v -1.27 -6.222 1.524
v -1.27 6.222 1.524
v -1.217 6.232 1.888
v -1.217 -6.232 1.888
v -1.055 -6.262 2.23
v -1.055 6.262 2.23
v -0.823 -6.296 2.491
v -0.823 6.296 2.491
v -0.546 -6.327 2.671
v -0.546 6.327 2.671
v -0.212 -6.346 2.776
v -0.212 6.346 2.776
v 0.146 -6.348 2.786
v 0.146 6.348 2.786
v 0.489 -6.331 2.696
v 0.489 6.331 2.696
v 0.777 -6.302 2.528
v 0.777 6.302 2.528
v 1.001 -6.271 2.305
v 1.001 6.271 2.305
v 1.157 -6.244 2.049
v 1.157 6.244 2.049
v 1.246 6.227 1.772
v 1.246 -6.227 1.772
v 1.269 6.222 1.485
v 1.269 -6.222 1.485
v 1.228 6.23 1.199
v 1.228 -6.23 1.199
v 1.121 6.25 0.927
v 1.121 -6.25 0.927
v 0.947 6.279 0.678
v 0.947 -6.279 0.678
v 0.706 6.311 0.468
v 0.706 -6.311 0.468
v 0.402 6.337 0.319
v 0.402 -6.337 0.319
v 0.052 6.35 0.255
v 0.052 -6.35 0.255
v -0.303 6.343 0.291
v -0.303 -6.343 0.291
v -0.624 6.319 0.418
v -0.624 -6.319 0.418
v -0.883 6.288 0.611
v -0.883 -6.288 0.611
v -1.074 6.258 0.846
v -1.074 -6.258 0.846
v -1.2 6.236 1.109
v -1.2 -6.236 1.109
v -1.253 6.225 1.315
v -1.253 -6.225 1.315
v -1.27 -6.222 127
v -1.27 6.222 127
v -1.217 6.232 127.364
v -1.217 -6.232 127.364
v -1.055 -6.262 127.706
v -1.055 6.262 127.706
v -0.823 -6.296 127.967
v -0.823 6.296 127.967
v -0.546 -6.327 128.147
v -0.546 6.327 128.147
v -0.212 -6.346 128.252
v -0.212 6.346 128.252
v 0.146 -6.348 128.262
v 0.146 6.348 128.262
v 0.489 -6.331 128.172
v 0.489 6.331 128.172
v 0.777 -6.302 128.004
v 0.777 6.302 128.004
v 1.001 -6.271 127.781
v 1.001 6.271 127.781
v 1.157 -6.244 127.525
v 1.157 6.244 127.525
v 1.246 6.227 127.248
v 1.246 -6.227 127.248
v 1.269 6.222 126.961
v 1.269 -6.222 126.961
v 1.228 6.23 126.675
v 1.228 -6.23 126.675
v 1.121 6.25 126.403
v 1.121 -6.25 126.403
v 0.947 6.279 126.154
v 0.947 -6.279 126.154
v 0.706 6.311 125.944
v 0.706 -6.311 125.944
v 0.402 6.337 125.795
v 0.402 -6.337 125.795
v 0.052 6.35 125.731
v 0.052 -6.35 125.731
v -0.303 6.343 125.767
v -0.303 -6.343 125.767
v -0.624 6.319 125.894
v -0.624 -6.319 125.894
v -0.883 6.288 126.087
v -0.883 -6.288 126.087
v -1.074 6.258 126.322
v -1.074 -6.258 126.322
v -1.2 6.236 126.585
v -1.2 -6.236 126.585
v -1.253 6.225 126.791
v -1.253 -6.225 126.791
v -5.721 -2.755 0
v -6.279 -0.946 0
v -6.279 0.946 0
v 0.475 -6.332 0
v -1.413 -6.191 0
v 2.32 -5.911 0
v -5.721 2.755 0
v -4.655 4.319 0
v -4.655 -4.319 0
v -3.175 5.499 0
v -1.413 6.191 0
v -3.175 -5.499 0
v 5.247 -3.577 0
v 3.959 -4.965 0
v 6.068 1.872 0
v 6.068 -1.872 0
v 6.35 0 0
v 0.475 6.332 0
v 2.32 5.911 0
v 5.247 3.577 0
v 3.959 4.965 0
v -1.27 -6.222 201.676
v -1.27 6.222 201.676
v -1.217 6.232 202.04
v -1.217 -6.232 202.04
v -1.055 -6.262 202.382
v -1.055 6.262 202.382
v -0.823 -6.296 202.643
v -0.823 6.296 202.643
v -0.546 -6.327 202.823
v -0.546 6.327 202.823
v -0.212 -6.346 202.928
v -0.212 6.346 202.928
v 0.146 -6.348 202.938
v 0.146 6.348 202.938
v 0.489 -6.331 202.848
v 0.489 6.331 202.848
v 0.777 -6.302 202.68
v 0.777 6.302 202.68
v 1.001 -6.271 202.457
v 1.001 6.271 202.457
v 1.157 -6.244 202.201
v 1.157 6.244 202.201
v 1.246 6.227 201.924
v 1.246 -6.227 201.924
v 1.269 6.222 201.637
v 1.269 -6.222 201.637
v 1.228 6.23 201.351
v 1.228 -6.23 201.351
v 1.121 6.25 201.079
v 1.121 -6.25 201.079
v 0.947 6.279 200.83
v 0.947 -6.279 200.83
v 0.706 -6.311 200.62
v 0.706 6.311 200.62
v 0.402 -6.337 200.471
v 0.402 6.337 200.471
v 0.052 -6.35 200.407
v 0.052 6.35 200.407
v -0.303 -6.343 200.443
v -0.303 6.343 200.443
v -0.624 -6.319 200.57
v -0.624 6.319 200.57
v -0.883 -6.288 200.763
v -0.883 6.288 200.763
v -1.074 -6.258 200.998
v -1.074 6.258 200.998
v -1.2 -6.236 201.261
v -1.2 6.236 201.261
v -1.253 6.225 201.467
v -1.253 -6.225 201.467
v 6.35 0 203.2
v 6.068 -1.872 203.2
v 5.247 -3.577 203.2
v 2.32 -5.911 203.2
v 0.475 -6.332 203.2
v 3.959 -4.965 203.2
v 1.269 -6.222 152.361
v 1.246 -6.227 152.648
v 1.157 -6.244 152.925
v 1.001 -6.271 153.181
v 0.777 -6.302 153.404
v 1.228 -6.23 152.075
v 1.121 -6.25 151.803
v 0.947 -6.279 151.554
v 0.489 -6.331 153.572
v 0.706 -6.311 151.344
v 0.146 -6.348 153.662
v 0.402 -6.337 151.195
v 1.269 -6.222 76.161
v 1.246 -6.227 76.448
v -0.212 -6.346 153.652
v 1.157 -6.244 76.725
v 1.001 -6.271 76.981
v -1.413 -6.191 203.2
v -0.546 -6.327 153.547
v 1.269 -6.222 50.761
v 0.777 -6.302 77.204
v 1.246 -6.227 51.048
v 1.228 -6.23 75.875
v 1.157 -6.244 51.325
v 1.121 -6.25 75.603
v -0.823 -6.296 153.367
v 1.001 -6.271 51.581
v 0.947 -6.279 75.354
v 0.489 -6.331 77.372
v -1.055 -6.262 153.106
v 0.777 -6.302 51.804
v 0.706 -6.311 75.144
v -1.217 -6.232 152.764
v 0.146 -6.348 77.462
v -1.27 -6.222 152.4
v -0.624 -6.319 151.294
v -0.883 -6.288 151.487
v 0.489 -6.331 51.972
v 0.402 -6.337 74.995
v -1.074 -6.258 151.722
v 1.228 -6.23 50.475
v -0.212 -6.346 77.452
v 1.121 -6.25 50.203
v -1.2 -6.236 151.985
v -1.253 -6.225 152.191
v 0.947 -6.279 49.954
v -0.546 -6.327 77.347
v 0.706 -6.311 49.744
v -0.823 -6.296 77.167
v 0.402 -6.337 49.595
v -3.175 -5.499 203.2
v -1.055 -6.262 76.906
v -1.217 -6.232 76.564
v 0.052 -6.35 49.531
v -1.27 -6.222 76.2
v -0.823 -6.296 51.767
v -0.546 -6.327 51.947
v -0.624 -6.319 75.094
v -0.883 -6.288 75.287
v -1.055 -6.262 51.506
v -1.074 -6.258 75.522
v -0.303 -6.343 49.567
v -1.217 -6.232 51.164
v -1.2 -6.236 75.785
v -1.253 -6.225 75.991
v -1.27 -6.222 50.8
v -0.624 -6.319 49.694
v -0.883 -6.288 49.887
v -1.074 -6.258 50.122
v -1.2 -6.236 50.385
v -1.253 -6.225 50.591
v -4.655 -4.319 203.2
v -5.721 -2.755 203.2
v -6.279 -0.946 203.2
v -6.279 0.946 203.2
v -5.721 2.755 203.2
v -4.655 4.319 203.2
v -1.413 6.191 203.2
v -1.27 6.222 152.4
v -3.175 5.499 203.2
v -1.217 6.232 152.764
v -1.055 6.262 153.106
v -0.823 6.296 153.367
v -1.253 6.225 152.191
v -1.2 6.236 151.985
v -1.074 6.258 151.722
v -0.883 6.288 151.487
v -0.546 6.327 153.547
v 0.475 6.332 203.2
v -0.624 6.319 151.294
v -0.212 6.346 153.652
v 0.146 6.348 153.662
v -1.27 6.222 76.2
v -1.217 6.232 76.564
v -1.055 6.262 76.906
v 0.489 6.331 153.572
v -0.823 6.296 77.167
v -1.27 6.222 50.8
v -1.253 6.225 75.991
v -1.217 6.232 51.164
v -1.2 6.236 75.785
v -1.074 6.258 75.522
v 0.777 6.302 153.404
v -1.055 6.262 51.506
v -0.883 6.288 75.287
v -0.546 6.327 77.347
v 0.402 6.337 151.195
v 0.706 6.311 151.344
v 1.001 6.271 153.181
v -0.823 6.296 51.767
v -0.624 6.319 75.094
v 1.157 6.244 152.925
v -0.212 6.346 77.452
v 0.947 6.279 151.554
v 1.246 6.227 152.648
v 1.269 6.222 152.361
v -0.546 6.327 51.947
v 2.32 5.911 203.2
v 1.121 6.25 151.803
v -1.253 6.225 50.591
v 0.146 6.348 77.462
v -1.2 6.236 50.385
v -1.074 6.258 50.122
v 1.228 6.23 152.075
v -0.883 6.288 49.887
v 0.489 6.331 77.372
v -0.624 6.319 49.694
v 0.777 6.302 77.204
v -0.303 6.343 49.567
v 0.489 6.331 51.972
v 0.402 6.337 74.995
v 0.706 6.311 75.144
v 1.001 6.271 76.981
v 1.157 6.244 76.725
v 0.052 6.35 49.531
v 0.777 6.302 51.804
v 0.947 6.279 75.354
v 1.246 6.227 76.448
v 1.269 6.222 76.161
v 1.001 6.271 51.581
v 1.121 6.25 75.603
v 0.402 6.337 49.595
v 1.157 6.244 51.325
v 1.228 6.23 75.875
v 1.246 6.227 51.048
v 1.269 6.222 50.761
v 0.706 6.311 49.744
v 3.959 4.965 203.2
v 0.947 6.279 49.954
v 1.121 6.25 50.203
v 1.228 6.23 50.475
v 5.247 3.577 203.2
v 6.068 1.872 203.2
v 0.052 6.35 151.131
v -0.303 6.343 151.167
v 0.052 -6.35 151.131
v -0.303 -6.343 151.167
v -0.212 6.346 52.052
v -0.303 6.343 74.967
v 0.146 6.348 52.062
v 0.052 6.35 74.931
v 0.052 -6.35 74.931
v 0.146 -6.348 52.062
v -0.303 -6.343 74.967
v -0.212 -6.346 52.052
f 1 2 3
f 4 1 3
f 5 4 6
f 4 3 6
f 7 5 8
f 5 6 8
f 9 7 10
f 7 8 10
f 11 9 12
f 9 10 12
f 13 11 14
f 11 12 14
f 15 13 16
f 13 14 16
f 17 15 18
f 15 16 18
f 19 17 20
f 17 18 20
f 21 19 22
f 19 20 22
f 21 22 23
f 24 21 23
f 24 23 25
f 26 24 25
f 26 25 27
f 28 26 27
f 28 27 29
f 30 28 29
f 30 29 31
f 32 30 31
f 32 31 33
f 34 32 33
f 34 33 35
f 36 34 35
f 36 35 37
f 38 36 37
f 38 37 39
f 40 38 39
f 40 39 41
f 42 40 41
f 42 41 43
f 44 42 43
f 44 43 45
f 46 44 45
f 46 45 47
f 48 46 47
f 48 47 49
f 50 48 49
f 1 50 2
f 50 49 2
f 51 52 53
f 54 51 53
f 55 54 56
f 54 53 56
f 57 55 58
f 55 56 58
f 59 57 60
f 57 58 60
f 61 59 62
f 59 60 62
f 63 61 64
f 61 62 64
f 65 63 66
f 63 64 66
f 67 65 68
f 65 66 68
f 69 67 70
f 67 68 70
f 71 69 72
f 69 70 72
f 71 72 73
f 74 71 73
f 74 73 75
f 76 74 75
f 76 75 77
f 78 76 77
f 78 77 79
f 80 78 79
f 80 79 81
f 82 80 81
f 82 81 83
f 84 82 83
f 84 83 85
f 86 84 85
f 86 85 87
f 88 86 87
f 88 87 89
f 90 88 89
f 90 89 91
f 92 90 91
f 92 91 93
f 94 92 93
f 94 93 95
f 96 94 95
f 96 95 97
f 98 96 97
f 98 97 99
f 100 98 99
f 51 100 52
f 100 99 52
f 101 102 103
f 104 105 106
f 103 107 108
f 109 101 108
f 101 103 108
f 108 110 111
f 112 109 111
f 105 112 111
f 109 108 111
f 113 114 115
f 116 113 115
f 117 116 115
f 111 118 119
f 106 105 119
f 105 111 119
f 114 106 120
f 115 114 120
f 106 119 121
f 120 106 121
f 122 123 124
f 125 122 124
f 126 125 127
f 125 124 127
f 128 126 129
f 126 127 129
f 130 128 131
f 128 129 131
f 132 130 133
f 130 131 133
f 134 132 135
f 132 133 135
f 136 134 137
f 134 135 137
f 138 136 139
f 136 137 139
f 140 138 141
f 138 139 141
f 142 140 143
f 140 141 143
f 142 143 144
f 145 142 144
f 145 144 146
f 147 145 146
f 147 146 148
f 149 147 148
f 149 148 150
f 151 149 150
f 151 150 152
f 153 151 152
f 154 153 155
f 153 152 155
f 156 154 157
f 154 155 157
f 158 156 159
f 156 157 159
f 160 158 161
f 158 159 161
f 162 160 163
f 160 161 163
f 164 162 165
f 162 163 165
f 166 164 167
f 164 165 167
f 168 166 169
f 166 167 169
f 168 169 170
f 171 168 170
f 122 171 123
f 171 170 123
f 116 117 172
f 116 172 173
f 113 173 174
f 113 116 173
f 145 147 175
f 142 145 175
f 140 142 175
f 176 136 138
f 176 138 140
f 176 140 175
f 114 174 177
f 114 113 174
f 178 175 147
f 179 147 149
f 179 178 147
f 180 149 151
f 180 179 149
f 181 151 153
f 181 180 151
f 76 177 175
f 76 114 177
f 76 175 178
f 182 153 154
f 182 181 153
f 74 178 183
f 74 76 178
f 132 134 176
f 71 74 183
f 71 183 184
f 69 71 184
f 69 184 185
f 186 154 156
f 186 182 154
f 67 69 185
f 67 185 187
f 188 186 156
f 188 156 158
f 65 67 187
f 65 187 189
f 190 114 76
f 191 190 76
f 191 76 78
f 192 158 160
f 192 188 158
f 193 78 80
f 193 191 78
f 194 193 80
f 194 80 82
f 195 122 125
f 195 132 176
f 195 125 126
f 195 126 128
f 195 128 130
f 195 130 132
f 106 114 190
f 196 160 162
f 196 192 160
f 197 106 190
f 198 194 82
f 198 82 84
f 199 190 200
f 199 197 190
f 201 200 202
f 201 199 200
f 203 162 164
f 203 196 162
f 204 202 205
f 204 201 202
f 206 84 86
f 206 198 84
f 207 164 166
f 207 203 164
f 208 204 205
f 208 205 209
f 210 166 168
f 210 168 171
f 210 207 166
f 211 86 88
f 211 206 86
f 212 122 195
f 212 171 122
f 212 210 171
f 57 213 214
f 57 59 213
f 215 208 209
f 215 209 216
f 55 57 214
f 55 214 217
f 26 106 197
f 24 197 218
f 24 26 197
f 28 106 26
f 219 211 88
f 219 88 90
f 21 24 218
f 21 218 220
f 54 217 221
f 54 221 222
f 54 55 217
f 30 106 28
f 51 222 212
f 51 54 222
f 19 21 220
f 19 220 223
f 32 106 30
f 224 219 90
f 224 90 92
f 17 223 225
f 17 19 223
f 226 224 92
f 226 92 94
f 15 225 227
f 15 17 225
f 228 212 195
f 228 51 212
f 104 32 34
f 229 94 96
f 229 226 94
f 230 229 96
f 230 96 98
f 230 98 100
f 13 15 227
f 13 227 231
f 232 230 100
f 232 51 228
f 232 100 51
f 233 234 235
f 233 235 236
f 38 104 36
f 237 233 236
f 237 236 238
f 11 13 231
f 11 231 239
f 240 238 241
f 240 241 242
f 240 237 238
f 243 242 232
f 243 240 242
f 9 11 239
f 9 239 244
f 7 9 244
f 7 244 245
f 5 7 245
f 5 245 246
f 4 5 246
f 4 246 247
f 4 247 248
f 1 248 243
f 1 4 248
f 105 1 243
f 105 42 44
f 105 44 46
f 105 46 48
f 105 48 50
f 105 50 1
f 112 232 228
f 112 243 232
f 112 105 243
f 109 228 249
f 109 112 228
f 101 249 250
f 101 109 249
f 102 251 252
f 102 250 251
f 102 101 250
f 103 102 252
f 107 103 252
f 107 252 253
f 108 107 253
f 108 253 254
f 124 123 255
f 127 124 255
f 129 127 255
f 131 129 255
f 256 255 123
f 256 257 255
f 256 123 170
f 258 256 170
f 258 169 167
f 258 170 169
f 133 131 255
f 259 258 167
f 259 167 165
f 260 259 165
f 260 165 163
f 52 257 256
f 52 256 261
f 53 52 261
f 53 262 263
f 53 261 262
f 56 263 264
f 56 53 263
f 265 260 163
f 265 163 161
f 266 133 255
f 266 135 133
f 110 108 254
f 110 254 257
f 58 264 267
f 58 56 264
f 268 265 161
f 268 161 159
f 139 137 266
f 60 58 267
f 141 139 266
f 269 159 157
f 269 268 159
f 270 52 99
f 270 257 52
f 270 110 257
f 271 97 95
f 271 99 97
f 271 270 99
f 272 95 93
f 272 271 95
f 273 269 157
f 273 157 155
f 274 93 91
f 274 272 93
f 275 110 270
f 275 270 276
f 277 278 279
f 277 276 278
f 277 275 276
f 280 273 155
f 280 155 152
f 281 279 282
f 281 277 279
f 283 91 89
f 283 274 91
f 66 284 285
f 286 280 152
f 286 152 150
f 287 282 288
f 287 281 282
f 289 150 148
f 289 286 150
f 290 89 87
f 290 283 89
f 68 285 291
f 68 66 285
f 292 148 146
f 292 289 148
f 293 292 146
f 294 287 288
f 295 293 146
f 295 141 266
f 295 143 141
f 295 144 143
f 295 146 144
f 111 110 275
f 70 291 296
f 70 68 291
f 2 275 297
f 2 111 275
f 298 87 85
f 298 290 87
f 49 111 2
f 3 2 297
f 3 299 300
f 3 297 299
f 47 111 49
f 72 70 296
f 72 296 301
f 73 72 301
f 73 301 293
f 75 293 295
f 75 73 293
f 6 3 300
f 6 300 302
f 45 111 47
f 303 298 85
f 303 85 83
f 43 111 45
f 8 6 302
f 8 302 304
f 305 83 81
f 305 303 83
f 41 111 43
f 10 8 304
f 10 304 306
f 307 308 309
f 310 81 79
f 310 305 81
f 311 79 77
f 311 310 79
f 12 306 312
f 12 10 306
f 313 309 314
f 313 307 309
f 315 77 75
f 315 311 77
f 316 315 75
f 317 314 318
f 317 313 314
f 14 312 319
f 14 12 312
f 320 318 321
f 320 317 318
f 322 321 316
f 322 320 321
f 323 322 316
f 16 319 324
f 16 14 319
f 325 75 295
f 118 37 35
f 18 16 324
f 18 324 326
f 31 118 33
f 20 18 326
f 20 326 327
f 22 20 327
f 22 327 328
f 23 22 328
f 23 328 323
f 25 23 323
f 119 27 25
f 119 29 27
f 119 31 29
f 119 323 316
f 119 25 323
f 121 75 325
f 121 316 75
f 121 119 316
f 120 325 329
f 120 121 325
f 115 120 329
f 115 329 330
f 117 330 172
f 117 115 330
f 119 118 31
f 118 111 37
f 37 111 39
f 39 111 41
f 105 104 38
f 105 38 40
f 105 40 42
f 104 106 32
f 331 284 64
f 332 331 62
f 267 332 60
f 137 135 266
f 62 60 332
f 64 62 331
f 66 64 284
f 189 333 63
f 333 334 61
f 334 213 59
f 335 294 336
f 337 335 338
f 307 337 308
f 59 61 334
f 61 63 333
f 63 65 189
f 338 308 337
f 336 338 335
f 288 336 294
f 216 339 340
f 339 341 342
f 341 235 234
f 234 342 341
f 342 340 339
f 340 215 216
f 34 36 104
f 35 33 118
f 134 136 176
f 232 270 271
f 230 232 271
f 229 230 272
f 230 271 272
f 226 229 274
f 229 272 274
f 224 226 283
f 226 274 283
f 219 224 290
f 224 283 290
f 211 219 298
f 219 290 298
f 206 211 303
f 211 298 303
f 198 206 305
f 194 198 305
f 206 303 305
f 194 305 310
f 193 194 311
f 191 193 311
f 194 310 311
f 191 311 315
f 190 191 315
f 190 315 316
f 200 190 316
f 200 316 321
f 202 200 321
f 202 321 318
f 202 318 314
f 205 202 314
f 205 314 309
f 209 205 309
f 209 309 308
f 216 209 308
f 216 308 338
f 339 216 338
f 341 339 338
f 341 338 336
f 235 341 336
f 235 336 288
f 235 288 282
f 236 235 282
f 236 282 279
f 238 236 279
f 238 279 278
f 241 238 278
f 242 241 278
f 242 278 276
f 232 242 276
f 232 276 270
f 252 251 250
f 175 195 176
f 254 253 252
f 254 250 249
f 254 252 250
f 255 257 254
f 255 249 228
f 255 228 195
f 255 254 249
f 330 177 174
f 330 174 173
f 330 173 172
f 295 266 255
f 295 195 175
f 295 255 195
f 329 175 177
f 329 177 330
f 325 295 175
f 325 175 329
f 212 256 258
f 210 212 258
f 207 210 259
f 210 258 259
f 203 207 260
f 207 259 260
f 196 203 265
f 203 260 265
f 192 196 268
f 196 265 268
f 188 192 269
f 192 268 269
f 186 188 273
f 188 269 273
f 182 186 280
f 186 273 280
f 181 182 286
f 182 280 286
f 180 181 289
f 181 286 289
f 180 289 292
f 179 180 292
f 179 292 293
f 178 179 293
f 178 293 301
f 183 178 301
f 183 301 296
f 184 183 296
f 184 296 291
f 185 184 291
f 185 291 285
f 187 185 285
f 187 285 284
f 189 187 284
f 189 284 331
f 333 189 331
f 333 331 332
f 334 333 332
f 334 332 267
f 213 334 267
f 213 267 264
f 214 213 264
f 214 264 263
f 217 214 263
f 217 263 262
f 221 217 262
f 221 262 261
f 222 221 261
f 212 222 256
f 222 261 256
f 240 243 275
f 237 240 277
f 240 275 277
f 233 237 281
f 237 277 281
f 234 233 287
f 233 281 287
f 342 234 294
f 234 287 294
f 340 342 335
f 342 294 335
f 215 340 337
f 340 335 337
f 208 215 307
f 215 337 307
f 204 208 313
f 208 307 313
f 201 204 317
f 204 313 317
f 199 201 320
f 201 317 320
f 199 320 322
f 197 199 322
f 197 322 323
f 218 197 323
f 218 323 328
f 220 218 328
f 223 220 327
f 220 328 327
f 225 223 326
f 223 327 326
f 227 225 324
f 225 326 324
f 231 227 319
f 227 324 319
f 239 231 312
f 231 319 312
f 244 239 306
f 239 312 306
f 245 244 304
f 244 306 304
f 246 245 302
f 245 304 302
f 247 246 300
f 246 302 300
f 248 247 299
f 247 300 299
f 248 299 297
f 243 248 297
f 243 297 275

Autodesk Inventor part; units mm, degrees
ref_plane "YZ Plane" through (0, 0, 0) normal (1, 0, 0) x (0, 1, 0)
ref_plane "XZ Plane" through (0, 0, 0) normal (0, 1, 0) x (-1, 0, 0)
ref_plane "XY Plane" through (0, 0, 0) normal (0, 0, 1) x (1, 0, 0)
sketch "Sketch1" plane through (0, 0, 0) normal (0, 0, 1) x (1, 0, 0)
  circle A0 centre (0, 0) radius 6.35
  dimension "d0" = 12.7
extrude "Extrusion1" add sketch "Sketch1" along normal blind 203.2
sketch "Sketch4" plane through (0, 0, 0) normal (0, 1, 0) x (-1, 0, 0)
  line L0 (0, 0) -> (0, 1.524)
  line L1 (6.35, 203.2) -> (-6.35, 203.2) projected
  line L2 (0, 203.2) -> (0, 201.676)
  circle A0 centre (0, 201.676) radius 1.27
  circle A1 centre (0, 1.524) radius 1.27
  dimension "d13" = 1.524
  dimension "d15" = 1.524
  dimension "d16" = 2.54
  dimension "d19" = 2.54
extrude "Extrusion4" cut sketch "Sketch4" along normal mid plane 15.24
sketch "Sketch8" plane through (0, 0, 0) normal (0, 1, 0) x (-1, 0, 0)
  line L0 (0, 0) -> (0, 50.8)
  circle A0 centre (0, 50.8) radius 1.27
  line L1 (0, 50.8) -> (0, 76.2)
  circle A1 centre (0, 76.2) radius 1.27
  line L2 (6.35, 203.2) -> (-6.35, 203.2) projected
  line L3 (0, 203.2) -> (0, 152.4)
  circle A2 centre (0, 152.4) radius 1.27
  line L4 (0, 152.4) -> (0, 127)
  circle A3 centre (0, 127) radius 1.27
  dimension "d50" = 50.8
  dimension "d51" = 2.54
  dimension "d58" = 25.4
  dimension "d59" = 2.54
  dimension "d60" = 50.8
  dimension "d61" = 2.54
  dimension "d62" = 25.4
  dimension "d63" = 2.54
extrude "Extrusion10" cut sketch "Sketch8" along normal mid plane 25.4
properties part number "Straw"
